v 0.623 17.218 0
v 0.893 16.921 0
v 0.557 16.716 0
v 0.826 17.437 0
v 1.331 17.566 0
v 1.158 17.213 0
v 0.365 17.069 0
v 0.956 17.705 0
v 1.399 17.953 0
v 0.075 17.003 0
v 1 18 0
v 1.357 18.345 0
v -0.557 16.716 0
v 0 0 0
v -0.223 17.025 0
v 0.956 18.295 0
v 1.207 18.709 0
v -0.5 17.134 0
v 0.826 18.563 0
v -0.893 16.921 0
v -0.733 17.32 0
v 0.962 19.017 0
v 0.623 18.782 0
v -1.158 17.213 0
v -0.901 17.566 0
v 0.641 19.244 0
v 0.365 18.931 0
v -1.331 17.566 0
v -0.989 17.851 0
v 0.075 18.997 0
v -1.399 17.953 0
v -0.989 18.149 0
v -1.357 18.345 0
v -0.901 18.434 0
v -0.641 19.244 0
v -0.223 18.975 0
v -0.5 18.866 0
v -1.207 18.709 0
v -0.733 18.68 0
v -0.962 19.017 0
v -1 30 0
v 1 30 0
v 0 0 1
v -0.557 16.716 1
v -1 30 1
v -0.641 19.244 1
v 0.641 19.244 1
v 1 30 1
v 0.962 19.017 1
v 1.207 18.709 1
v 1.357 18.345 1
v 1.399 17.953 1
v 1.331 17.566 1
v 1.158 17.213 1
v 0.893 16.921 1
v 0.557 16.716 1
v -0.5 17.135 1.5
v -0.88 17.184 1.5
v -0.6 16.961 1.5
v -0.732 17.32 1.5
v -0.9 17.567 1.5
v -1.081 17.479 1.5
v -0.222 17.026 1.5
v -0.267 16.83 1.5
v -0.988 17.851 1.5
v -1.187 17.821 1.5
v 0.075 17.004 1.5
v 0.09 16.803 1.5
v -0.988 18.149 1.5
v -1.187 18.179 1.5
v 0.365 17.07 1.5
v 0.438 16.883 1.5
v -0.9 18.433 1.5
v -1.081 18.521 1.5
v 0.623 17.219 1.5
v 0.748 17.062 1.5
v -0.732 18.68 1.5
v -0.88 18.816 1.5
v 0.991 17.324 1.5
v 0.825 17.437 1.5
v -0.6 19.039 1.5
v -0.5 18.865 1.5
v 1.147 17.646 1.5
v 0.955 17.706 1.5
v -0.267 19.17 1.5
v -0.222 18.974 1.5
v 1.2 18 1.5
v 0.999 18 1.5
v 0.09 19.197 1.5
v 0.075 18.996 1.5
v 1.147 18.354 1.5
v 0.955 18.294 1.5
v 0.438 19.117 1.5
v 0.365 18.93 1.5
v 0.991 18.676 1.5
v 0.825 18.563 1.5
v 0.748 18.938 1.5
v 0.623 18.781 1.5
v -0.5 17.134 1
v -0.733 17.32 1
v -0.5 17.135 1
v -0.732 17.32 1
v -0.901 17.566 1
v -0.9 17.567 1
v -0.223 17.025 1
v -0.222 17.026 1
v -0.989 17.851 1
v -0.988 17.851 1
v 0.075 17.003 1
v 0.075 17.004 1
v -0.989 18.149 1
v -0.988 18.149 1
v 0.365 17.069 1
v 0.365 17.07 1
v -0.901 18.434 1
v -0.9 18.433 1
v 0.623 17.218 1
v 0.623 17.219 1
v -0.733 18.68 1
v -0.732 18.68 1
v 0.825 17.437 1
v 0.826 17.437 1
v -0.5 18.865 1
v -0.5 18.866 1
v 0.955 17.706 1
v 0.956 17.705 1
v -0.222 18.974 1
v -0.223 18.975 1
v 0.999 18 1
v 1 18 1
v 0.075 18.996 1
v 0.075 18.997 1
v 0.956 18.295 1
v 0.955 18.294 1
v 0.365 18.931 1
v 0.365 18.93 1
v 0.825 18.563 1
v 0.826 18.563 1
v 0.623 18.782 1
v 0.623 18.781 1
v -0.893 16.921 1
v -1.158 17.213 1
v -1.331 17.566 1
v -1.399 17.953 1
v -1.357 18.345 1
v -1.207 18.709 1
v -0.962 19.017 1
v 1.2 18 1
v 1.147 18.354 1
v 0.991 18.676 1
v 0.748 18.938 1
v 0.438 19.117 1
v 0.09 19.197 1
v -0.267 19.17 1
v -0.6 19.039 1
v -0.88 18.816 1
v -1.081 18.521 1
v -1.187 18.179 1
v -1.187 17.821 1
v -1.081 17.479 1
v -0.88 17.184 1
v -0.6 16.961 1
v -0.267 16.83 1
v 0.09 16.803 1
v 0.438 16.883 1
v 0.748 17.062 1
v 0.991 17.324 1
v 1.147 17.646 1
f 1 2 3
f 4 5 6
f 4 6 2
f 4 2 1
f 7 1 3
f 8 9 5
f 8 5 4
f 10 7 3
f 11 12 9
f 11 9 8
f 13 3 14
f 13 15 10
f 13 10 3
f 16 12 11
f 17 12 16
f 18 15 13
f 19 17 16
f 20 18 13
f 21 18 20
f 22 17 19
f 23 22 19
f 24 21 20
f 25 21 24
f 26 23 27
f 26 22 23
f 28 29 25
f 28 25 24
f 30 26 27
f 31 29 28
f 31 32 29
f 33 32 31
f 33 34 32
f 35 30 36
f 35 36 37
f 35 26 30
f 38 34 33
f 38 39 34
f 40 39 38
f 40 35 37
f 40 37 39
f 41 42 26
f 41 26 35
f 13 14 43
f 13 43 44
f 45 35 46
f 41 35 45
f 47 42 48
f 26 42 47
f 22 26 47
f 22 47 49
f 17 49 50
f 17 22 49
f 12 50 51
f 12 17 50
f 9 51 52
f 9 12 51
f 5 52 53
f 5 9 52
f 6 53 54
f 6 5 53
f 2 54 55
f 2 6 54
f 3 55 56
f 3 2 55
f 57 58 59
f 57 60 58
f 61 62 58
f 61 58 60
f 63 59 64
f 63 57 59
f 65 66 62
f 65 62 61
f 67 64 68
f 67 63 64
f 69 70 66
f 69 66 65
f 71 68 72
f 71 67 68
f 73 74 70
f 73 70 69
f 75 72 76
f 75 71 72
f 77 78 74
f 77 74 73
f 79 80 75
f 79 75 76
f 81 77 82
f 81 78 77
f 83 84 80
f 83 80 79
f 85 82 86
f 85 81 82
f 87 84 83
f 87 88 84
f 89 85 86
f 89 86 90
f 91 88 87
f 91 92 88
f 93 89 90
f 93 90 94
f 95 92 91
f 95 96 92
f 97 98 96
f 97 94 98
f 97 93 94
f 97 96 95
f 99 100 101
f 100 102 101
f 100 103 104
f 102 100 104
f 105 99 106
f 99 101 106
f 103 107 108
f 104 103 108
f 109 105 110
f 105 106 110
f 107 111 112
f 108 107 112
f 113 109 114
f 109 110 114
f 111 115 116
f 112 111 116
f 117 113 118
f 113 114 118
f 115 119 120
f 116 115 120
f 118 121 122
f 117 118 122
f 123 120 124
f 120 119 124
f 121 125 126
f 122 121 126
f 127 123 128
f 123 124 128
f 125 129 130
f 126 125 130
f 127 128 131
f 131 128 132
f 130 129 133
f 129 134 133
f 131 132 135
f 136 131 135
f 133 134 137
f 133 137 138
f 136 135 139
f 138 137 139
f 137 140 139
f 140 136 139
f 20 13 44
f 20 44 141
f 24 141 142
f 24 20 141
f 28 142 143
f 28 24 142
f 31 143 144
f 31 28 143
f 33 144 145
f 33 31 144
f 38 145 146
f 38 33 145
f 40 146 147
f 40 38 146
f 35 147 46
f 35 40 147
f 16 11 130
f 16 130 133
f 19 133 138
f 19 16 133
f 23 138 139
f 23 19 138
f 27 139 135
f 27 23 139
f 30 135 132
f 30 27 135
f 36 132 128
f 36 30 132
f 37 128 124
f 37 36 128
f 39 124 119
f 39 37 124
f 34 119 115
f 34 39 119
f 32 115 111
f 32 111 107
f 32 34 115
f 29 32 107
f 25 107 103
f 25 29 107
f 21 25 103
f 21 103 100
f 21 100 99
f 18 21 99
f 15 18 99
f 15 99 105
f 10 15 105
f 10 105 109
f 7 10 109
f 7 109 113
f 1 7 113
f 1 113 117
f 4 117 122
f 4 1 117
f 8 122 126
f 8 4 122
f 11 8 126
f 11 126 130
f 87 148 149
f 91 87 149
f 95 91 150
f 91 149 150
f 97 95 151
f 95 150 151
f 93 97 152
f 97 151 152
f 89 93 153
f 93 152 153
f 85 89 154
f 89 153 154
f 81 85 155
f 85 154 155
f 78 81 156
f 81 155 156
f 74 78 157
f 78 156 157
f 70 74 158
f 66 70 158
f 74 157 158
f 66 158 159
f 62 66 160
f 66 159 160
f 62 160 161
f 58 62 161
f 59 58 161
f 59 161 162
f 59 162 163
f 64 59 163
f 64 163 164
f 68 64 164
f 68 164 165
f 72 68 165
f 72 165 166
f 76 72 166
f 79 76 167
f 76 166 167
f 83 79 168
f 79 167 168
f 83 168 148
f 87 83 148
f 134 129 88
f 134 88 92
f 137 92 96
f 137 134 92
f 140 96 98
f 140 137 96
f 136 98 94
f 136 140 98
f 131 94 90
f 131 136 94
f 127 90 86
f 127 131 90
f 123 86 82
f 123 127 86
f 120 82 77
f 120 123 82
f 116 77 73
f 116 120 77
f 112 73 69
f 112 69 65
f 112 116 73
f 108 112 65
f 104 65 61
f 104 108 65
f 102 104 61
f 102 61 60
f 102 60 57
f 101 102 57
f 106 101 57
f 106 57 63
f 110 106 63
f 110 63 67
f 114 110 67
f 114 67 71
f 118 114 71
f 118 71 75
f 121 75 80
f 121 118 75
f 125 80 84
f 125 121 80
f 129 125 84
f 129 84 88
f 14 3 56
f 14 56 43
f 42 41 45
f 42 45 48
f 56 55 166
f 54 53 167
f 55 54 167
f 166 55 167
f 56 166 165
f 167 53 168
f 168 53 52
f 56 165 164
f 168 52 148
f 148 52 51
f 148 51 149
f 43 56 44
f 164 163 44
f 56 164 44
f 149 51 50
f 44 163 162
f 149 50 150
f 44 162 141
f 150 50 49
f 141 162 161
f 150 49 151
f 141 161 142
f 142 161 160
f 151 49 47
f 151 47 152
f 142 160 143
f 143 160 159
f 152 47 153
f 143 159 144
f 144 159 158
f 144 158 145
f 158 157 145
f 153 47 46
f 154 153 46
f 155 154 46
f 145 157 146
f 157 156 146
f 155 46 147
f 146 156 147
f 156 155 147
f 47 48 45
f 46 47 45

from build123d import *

# Parameters (mm, degrees)
ESBO_O1_R                = 1
RESSALTO_EXTRUS_O1_DEPTH = 1
ESBO_O3_R                = 1.2
ESBO_O3_R_2              = 0.999056936
RESSALTO_EXTRUS_O2_DEPTH = 0.5


with BuildPart() as part:
    # Esboço1 → Ressalto-extrusão1 (new body)
    with BuildSketch(Plane.XY):
        with BuildLine():
            Line((0, 30), (1, 30))
            Line((1, 30), (0.641479632, 19.244388959))
            ThreePointArc((0.641479632, 19.244388959), (1.39922287, 17.953359238), (0.557188515, 16.715655436))
            Line((0.557188515, 16.715655436), (0, 0))
            Line((0, 0), (-0.557188515, 16.715655436))
            ThreePointArc((-0.557188515, 16.715655436), (-1.39922287, 17.953359238), (-0.641479632, 19.244388959))
            Line((-0.641479632, 19.244388959), (-1, 30))
            Line((-1, 30), (0, 30))
        make_face()
        with Locations((0, 18)):
            Circle(ESBO_O1_R, mode=Mode.SUBTRACT)
    extrude(amount=RESSALTO_EXTRUS_O1_DEPTH)

    # Esboço3 → Ressalto-extrusão2 (add)
    with BuildSketch(Plane.XY.offset(1)):
        with Locations((0, 18)):
            Circle(ESBO_O3_R)
        with Locations((0, 18)):
            Circle(ESBO_O3_R_2, mode=Mode.SUBTRACT)
    extrude(amount=RESSALTO_EXTRUS_O2_DEPTH)


solid = part.part
